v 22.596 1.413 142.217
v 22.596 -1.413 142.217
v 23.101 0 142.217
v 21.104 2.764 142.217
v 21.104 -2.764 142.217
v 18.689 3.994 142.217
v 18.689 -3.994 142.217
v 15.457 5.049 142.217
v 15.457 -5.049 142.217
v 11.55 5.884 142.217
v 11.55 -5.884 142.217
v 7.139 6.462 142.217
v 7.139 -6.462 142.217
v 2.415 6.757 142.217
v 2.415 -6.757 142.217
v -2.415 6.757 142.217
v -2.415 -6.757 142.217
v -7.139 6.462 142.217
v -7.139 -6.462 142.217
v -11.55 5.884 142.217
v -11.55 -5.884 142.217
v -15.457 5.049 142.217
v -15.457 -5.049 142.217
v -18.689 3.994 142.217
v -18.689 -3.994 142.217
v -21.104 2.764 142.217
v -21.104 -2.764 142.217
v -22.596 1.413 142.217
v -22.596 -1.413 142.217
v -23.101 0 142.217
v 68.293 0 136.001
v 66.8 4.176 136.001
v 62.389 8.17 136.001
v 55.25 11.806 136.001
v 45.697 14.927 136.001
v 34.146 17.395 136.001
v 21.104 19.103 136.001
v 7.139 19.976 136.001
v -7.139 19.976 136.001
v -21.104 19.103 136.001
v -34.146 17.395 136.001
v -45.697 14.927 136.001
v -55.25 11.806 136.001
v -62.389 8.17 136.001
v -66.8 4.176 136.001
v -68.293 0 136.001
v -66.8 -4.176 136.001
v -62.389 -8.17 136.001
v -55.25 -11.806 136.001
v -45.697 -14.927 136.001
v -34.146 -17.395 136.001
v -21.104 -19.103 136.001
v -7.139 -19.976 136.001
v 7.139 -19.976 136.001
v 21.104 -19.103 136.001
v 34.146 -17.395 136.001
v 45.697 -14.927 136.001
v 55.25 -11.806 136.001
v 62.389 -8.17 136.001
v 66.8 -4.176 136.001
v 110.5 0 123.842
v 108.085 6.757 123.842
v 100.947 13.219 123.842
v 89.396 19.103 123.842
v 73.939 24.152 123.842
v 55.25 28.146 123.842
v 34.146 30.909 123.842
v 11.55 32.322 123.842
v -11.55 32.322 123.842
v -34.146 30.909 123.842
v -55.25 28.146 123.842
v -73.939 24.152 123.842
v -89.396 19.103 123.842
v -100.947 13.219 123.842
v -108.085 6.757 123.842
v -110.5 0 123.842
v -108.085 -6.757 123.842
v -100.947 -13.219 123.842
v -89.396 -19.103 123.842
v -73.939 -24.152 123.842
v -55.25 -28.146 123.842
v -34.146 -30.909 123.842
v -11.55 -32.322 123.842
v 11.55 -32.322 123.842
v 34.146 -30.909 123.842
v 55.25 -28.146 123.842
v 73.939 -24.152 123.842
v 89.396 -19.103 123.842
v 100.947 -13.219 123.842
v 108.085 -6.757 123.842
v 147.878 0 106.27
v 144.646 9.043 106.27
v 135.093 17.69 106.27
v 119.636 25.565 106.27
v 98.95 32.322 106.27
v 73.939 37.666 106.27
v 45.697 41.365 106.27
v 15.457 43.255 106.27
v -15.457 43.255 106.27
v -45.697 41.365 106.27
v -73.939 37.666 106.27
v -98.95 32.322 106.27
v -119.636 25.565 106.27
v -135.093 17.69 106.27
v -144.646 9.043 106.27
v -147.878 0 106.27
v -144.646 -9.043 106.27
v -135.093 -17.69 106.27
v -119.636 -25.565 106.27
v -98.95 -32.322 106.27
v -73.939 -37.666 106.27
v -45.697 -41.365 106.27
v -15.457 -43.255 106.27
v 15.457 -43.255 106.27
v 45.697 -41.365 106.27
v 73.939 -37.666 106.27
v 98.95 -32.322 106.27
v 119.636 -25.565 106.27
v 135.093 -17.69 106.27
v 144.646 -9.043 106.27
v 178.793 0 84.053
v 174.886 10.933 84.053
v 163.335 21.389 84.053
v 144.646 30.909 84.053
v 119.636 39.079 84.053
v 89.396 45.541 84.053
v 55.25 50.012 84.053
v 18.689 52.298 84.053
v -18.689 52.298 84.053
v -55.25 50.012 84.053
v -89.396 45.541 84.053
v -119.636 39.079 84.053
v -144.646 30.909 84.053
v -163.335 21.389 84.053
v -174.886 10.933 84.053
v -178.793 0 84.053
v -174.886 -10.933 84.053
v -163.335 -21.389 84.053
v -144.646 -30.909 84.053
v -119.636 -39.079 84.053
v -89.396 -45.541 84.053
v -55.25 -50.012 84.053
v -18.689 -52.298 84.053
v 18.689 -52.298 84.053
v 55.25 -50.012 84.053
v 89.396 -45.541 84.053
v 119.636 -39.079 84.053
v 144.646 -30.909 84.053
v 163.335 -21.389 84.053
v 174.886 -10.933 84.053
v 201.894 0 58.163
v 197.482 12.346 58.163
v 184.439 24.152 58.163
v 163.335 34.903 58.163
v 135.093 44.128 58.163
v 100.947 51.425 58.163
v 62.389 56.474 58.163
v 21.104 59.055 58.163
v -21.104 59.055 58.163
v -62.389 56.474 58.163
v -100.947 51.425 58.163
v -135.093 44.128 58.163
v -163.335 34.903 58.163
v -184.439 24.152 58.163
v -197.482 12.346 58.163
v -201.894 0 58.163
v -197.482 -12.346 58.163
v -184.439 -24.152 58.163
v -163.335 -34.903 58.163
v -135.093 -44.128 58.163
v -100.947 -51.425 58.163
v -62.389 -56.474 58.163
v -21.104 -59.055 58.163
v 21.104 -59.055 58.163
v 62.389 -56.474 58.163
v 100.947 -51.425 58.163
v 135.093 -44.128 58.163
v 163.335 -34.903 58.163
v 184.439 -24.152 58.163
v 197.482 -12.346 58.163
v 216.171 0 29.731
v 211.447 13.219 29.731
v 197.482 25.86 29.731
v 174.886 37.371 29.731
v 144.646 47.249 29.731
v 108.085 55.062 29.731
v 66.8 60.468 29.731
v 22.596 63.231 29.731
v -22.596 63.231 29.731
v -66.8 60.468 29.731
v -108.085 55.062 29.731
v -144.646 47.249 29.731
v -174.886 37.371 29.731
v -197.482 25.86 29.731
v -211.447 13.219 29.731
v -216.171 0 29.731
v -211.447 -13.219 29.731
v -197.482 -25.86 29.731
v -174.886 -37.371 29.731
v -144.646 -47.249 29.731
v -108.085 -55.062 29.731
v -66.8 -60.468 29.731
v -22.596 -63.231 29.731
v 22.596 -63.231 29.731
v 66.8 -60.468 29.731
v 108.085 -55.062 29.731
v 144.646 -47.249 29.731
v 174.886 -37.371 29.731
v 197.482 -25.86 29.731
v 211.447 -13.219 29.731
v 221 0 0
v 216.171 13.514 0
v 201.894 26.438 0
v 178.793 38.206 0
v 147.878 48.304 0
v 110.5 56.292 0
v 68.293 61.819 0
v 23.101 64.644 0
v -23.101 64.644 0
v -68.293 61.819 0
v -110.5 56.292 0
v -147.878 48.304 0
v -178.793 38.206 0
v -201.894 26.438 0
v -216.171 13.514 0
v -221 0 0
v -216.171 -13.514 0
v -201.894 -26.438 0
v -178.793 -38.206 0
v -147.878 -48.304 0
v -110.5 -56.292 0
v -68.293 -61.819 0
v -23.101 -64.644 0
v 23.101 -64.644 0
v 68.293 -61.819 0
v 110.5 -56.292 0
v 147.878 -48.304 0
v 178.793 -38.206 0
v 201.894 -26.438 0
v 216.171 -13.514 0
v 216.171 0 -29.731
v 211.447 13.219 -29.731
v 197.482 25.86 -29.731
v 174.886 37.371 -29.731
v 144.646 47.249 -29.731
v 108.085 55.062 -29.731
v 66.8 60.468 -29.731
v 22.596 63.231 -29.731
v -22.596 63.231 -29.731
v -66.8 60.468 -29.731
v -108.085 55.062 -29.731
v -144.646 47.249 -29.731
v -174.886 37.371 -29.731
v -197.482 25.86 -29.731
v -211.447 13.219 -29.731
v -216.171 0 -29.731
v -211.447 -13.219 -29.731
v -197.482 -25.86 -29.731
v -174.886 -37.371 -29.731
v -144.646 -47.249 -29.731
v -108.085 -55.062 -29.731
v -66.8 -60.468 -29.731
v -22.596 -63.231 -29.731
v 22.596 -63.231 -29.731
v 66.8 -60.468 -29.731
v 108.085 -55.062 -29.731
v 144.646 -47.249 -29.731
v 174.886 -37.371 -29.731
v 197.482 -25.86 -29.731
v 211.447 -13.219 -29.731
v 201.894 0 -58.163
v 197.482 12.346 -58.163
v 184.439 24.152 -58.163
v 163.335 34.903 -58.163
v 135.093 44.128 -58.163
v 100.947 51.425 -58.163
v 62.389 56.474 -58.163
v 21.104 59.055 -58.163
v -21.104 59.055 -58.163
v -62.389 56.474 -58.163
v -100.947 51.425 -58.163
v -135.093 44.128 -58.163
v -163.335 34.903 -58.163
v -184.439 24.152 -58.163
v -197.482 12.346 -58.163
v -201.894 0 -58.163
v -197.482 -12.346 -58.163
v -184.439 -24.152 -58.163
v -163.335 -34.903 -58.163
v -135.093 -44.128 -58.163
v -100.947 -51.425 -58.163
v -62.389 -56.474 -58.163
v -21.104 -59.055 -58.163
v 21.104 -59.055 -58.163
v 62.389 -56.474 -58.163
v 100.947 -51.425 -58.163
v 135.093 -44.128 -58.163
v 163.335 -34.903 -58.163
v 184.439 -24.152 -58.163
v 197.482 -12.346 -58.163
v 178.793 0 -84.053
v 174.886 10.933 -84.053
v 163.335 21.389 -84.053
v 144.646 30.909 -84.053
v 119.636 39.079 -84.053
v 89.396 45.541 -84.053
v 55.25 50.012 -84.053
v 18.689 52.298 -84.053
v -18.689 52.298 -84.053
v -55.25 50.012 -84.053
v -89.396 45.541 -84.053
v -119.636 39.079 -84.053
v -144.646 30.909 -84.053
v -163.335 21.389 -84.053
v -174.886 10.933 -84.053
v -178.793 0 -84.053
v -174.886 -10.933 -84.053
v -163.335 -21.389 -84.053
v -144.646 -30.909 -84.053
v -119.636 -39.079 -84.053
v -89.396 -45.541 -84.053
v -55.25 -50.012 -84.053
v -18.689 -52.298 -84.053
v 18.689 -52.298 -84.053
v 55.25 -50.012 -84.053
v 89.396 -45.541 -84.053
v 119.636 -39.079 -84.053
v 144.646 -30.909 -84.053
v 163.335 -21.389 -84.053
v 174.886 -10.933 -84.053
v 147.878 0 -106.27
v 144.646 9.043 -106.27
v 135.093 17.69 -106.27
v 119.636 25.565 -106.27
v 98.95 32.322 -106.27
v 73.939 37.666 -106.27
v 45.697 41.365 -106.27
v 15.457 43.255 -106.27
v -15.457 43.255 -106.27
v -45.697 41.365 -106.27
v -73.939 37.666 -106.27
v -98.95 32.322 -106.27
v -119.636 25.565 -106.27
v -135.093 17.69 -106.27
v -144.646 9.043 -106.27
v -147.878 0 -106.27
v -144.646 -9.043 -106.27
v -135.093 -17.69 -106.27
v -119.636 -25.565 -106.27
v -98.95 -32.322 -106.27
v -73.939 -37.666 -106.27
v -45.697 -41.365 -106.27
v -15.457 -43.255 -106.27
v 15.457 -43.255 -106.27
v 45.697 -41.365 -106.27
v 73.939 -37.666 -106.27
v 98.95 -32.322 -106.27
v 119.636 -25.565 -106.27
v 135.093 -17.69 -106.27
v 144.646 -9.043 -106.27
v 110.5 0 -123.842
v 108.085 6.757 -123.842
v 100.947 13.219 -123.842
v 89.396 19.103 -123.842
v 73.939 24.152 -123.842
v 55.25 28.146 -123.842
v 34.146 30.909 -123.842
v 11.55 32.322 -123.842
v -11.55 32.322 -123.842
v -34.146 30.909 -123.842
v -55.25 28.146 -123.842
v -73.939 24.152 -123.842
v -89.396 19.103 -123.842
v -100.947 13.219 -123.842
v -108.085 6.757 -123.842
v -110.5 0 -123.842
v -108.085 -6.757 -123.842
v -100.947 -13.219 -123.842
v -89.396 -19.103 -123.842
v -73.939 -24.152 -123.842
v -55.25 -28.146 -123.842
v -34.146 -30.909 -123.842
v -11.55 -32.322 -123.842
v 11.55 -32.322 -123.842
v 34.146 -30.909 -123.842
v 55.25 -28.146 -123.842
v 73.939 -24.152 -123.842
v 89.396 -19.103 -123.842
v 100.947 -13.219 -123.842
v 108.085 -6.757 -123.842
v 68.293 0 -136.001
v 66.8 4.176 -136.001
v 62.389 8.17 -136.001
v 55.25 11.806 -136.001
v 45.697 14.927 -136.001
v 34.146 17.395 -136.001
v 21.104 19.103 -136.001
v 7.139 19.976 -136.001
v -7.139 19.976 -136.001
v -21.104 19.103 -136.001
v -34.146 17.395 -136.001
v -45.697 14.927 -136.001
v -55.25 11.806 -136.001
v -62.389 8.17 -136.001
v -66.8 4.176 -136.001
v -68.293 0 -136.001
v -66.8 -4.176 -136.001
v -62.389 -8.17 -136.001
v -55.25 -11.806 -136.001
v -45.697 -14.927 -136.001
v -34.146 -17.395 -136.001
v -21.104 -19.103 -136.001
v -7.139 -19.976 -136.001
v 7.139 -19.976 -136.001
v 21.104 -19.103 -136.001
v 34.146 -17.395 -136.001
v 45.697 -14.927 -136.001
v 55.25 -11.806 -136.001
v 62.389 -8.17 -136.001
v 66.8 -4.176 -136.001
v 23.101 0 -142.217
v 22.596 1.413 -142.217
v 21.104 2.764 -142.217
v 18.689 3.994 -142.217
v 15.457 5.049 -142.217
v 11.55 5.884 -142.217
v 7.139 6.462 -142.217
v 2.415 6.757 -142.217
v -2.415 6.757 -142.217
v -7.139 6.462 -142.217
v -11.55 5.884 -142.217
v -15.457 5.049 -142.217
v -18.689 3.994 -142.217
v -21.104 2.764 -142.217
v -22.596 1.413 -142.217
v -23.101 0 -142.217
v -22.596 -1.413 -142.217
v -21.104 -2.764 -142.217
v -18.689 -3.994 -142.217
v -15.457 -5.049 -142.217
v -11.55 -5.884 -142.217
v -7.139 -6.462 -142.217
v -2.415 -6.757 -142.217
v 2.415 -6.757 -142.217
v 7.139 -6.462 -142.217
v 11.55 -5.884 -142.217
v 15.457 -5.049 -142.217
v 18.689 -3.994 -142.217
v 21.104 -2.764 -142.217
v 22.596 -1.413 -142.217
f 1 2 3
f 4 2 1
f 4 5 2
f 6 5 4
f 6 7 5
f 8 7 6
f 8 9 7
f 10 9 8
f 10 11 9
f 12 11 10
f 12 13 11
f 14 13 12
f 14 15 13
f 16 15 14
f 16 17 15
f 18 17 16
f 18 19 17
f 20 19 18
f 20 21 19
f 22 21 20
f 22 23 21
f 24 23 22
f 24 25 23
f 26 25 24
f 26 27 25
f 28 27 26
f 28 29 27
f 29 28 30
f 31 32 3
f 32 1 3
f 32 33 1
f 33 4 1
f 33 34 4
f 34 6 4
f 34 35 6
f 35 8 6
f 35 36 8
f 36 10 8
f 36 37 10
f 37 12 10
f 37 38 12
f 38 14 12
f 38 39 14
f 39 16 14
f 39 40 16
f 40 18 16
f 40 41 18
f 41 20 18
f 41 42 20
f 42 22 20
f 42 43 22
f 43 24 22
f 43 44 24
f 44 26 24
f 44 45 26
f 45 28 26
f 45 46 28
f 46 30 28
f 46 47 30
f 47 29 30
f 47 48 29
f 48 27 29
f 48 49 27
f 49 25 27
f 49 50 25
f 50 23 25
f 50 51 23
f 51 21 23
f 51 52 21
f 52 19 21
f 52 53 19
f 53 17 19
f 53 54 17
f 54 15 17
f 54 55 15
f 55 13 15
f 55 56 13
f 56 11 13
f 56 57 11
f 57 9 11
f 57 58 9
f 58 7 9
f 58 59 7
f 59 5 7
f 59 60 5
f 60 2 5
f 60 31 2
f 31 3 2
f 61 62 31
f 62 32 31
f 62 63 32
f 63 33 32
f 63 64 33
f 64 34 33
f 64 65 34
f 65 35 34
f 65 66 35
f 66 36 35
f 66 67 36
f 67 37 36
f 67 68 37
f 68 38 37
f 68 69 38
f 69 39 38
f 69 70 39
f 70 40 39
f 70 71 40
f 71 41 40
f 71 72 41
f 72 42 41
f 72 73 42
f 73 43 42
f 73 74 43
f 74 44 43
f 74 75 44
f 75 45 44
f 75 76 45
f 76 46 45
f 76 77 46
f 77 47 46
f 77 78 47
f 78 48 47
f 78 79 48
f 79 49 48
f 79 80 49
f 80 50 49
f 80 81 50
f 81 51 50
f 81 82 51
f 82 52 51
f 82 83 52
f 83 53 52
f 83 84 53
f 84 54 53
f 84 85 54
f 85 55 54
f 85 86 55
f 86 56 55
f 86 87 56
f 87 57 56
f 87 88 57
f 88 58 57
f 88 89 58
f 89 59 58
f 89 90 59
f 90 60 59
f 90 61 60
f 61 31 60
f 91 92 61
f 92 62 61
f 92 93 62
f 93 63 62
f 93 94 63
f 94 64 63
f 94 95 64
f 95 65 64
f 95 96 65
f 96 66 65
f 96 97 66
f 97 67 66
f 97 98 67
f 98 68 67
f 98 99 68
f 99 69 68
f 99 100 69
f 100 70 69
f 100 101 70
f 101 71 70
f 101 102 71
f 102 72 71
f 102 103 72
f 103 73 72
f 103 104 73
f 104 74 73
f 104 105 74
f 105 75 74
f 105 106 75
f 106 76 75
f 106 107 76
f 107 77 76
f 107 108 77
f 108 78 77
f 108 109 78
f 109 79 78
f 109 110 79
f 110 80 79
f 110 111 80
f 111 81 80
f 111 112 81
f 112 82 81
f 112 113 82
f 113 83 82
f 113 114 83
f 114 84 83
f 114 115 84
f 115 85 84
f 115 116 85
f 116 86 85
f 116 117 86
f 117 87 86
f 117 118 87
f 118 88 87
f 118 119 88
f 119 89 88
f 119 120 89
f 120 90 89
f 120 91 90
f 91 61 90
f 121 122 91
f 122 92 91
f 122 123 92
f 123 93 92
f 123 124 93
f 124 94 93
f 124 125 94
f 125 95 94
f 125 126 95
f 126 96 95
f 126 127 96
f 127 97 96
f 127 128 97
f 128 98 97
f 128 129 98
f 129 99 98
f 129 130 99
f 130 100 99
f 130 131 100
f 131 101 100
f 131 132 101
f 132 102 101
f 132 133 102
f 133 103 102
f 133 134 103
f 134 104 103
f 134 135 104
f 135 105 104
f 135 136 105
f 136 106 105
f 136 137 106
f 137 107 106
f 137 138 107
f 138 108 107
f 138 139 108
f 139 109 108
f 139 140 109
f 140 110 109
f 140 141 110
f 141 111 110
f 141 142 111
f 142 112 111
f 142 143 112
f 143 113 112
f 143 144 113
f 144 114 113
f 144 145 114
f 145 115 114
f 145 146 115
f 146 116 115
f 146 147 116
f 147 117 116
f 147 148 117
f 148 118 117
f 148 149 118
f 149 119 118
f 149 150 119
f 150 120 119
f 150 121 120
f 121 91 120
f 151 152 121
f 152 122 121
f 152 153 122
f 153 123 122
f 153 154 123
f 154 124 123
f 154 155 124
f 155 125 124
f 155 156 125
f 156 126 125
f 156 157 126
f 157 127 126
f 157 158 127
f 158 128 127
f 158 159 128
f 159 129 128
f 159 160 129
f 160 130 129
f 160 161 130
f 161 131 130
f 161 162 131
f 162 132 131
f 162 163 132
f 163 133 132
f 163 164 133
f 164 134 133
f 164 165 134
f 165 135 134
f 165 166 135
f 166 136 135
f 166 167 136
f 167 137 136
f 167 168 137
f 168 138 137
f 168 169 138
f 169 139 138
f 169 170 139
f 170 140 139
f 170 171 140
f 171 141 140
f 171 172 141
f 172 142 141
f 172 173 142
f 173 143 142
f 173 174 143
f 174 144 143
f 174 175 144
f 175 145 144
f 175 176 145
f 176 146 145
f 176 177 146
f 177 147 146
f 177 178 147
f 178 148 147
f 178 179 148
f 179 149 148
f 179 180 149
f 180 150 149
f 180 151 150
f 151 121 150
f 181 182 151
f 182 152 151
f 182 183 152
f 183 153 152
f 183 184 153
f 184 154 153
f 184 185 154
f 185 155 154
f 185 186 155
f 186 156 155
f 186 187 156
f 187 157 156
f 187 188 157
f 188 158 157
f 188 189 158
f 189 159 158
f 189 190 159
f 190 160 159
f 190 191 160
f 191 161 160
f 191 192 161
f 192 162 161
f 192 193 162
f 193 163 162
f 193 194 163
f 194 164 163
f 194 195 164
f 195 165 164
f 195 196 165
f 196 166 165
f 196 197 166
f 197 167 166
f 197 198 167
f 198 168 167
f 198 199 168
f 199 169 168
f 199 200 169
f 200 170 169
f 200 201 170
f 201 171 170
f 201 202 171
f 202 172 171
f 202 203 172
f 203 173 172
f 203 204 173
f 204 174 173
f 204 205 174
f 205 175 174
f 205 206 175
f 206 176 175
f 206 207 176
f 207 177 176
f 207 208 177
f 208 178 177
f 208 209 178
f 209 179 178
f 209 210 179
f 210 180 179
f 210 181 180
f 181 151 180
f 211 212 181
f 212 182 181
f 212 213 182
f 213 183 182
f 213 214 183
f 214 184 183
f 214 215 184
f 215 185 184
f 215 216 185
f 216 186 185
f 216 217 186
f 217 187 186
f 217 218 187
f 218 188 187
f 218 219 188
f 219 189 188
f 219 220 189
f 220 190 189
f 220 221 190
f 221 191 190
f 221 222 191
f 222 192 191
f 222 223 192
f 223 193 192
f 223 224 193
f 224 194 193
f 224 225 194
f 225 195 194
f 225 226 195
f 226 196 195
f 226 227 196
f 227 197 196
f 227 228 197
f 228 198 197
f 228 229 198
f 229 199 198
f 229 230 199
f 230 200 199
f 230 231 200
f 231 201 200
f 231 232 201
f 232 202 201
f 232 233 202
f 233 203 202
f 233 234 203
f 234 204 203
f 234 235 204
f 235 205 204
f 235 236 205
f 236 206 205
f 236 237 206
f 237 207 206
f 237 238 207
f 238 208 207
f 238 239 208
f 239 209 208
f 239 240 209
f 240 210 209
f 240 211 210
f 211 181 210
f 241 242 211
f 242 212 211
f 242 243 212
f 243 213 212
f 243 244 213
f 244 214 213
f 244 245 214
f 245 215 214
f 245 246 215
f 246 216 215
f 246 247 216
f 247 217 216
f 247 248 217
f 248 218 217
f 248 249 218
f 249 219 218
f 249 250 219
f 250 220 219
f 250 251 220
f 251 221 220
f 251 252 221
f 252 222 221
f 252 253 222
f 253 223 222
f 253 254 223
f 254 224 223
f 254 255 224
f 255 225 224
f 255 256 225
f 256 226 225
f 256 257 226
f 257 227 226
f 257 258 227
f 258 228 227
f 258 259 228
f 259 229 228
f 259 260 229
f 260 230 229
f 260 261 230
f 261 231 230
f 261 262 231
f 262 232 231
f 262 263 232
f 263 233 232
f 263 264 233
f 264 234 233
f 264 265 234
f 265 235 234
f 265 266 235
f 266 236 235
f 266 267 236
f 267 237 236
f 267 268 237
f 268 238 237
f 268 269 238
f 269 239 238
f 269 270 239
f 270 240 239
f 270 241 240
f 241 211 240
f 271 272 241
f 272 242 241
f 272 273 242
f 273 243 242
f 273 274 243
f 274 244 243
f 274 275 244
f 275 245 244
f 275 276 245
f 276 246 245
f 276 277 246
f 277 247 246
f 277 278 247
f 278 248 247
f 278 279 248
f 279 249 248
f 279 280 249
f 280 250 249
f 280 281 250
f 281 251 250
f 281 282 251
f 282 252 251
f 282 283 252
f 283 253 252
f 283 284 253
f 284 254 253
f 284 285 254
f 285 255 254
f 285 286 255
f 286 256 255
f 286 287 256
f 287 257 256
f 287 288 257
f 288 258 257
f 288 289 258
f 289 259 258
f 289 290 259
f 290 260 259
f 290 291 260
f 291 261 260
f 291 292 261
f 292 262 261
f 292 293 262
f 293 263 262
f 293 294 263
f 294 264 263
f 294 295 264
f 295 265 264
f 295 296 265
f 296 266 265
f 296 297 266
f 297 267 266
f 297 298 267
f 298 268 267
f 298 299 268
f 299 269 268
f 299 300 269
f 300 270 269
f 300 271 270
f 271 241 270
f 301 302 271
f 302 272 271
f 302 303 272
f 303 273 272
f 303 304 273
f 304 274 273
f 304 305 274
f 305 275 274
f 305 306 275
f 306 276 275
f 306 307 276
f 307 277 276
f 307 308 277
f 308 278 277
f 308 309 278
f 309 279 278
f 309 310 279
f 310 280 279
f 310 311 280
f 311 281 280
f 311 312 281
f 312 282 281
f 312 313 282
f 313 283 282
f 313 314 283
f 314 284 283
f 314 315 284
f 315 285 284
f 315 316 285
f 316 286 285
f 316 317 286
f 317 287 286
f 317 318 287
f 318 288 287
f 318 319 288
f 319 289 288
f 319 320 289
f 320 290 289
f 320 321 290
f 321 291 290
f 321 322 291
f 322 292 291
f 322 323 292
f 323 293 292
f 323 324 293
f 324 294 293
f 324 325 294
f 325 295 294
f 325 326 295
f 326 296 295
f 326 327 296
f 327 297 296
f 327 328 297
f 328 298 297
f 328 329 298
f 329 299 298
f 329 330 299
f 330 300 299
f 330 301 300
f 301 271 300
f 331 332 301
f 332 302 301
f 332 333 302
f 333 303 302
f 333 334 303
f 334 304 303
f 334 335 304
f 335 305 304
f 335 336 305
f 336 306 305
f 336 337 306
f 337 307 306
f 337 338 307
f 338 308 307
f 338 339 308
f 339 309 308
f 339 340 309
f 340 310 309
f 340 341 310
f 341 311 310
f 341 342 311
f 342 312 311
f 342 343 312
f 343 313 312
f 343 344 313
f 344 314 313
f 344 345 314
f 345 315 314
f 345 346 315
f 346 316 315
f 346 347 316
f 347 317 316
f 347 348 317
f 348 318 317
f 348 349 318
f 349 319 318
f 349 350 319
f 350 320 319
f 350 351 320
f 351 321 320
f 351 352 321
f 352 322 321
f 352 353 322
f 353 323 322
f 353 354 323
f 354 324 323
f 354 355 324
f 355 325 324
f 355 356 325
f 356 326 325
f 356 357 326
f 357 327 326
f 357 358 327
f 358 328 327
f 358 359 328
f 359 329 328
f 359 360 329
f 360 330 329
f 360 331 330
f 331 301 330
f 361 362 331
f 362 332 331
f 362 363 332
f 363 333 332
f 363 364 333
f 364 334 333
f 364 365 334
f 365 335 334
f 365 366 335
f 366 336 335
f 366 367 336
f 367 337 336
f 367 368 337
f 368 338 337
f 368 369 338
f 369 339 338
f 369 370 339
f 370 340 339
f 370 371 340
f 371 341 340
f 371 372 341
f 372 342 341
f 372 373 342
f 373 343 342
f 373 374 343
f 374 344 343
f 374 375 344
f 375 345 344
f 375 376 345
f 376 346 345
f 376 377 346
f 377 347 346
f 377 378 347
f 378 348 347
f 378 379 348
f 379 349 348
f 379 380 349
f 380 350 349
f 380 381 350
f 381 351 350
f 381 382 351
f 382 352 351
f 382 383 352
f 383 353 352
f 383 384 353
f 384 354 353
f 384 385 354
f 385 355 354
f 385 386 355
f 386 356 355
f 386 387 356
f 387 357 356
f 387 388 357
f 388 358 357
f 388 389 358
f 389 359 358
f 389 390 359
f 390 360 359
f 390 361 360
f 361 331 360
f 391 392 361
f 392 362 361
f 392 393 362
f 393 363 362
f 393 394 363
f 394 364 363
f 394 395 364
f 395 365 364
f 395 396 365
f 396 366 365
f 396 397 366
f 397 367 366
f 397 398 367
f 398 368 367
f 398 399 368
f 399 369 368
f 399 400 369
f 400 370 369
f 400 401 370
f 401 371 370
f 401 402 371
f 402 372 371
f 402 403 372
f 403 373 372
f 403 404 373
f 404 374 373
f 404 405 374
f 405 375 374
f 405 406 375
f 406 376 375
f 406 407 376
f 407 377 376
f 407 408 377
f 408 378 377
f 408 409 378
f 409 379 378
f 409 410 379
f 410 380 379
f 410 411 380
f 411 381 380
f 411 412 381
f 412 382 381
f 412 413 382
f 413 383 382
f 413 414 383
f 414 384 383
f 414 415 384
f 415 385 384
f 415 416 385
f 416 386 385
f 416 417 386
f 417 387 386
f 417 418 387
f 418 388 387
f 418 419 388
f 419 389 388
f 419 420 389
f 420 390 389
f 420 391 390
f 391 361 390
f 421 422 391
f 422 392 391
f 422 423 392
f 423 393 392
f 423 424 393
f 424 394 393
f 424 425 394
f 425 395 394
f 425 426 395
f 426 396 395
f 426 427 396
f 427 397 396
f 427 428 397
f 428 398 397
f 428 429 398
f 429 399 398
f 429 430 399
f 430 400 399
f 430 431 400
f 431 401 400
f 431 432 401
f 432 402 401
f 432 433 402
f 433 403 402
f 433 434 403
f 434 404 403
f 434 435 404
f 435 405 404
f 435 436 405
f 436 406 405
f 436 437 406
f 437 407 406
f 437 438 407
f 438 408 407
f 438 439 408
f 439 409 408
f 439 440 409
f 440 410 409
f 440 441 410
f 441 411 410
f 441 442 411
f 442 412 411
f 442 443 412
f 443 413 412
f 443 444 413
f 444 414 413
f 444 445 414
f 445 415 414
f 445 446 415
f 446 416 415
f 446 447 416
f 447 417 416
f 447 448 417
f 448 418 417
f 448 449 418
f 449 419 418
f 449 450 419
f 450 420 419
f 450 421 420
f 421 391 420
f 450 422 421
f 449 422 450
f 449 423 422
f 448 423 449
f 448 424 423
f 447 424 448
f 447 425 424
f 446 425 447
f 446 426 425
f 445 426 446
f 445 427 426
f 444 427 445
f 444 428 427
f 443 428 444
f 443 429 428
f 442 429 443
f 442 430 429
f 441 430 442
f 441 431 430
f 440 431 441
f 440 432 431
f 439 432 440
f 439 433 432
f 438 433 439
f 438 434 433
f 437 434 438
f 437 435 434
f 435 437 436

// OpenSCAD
// Generated by SolidPython 1.0.1 on 2020-07-29 00:46:52


scale(v = [17, 5, 11]) {
	sphere(r = 13);
}
/***********************************************
*********      SolidPython code:      **********
************************************************
 
# import packages: SolidPython
from solid import *
from solid.utils import *
from itertools import chain, combinations, permutations


class Resize:

    def __init__(self, scad_file):
        self.scad_file = scad_file
        #self.scad_file = import_scad(scad_file)
        # cone/cylinder param:
        self.r1 = 0
        self.r2 = 0
        self.h = 0
        # rectangular prism param:
        self.w = 0
        self.l = 0
        # ellipse param:
        self.r = 0

    # import OpenScad code (file name corresponds to shape)


    # classify shape + parameters
    def assign(self, param1, param2, param3):
        if self.scad_file == 'cone.scad':
            self.r1 = param1
            self.r2 = param2
            self.h = param3
        elif self.scad_file == 'cylinder.scad':
            self.r1 = param1
            self.r2 = param2
            self.h = param3
        elif self.scad_file == 'rectangularPrism.scad':
            self.h = param1
            self.l = param2
            self.w = param3
        else:
            self.r = param1
            self.h = param2

    # resize parameters
    def iterate(self):
        x = range(3, 20, 2)
        i = 1
        if self.scad_file == 'cone.scad':
            tempList = list(permutations(x, 2))
            for temp in tempList:
                param1 = temp[0]
                param2 = temp[1]
                filepath = 'produced_scad_files/' + 'cone' + str(param1) + '_' + str(param2) + '_' + '.scad'
                scad_render_to_file(cylinder(h=param1, r1=param2, r2=0), filepath)

        elif self.scad_file == 'cylinder.scad':
            tempList = list(permutations(x, 3))
            for temp in tempList:
                param1 = temp[0]
                param2 = temp[1]
                filepath = 'produced_scad_files/' + 'cylinder' + str(param1) + '_' + str(param2) + '_' + '.scad'
                scad_render_to_file(cylinder(h=param1, r1=param2, r2=param2), filepath)

        elif self.scad_file == 'rectangularPrism.scad':
            tempList = list(permutations(x, 3))
            for temp in tempList:
                param1 = temp[0]
                param2 = temp[1]
                param3 = temp[2]
                filepath = 'produced_scad_files/' + 'rectangularPrism' + str(param1) + '_' + str(param2) + '_' + str(
                    param3) + '.scad'
                scad_render_to_file(cube(size=(param1, param2, param3)), filepath)

        elif self.scad_file == 'ellipse.scad':
            tempList = list(permutations(x, 4))
            for temp in tempList:
                param1 = temp[0]
                param2 = temp[1]
                param3 = temp[2]
                param4 = temp[3]
                filepath = 'produced_scad_files/' + 'ellipse' + str(param1) + '_' + str(param2) + '_' + str(param3) + '_' + str(param4) + '.scad'
                scad_render_to_file(scale([param1, param2, param3])(sphere(r=param4)), filepath)

    def render_to_scadfile(self):
        scad_render_to_file(scad, 'example.scad') 
 
************************************************/
